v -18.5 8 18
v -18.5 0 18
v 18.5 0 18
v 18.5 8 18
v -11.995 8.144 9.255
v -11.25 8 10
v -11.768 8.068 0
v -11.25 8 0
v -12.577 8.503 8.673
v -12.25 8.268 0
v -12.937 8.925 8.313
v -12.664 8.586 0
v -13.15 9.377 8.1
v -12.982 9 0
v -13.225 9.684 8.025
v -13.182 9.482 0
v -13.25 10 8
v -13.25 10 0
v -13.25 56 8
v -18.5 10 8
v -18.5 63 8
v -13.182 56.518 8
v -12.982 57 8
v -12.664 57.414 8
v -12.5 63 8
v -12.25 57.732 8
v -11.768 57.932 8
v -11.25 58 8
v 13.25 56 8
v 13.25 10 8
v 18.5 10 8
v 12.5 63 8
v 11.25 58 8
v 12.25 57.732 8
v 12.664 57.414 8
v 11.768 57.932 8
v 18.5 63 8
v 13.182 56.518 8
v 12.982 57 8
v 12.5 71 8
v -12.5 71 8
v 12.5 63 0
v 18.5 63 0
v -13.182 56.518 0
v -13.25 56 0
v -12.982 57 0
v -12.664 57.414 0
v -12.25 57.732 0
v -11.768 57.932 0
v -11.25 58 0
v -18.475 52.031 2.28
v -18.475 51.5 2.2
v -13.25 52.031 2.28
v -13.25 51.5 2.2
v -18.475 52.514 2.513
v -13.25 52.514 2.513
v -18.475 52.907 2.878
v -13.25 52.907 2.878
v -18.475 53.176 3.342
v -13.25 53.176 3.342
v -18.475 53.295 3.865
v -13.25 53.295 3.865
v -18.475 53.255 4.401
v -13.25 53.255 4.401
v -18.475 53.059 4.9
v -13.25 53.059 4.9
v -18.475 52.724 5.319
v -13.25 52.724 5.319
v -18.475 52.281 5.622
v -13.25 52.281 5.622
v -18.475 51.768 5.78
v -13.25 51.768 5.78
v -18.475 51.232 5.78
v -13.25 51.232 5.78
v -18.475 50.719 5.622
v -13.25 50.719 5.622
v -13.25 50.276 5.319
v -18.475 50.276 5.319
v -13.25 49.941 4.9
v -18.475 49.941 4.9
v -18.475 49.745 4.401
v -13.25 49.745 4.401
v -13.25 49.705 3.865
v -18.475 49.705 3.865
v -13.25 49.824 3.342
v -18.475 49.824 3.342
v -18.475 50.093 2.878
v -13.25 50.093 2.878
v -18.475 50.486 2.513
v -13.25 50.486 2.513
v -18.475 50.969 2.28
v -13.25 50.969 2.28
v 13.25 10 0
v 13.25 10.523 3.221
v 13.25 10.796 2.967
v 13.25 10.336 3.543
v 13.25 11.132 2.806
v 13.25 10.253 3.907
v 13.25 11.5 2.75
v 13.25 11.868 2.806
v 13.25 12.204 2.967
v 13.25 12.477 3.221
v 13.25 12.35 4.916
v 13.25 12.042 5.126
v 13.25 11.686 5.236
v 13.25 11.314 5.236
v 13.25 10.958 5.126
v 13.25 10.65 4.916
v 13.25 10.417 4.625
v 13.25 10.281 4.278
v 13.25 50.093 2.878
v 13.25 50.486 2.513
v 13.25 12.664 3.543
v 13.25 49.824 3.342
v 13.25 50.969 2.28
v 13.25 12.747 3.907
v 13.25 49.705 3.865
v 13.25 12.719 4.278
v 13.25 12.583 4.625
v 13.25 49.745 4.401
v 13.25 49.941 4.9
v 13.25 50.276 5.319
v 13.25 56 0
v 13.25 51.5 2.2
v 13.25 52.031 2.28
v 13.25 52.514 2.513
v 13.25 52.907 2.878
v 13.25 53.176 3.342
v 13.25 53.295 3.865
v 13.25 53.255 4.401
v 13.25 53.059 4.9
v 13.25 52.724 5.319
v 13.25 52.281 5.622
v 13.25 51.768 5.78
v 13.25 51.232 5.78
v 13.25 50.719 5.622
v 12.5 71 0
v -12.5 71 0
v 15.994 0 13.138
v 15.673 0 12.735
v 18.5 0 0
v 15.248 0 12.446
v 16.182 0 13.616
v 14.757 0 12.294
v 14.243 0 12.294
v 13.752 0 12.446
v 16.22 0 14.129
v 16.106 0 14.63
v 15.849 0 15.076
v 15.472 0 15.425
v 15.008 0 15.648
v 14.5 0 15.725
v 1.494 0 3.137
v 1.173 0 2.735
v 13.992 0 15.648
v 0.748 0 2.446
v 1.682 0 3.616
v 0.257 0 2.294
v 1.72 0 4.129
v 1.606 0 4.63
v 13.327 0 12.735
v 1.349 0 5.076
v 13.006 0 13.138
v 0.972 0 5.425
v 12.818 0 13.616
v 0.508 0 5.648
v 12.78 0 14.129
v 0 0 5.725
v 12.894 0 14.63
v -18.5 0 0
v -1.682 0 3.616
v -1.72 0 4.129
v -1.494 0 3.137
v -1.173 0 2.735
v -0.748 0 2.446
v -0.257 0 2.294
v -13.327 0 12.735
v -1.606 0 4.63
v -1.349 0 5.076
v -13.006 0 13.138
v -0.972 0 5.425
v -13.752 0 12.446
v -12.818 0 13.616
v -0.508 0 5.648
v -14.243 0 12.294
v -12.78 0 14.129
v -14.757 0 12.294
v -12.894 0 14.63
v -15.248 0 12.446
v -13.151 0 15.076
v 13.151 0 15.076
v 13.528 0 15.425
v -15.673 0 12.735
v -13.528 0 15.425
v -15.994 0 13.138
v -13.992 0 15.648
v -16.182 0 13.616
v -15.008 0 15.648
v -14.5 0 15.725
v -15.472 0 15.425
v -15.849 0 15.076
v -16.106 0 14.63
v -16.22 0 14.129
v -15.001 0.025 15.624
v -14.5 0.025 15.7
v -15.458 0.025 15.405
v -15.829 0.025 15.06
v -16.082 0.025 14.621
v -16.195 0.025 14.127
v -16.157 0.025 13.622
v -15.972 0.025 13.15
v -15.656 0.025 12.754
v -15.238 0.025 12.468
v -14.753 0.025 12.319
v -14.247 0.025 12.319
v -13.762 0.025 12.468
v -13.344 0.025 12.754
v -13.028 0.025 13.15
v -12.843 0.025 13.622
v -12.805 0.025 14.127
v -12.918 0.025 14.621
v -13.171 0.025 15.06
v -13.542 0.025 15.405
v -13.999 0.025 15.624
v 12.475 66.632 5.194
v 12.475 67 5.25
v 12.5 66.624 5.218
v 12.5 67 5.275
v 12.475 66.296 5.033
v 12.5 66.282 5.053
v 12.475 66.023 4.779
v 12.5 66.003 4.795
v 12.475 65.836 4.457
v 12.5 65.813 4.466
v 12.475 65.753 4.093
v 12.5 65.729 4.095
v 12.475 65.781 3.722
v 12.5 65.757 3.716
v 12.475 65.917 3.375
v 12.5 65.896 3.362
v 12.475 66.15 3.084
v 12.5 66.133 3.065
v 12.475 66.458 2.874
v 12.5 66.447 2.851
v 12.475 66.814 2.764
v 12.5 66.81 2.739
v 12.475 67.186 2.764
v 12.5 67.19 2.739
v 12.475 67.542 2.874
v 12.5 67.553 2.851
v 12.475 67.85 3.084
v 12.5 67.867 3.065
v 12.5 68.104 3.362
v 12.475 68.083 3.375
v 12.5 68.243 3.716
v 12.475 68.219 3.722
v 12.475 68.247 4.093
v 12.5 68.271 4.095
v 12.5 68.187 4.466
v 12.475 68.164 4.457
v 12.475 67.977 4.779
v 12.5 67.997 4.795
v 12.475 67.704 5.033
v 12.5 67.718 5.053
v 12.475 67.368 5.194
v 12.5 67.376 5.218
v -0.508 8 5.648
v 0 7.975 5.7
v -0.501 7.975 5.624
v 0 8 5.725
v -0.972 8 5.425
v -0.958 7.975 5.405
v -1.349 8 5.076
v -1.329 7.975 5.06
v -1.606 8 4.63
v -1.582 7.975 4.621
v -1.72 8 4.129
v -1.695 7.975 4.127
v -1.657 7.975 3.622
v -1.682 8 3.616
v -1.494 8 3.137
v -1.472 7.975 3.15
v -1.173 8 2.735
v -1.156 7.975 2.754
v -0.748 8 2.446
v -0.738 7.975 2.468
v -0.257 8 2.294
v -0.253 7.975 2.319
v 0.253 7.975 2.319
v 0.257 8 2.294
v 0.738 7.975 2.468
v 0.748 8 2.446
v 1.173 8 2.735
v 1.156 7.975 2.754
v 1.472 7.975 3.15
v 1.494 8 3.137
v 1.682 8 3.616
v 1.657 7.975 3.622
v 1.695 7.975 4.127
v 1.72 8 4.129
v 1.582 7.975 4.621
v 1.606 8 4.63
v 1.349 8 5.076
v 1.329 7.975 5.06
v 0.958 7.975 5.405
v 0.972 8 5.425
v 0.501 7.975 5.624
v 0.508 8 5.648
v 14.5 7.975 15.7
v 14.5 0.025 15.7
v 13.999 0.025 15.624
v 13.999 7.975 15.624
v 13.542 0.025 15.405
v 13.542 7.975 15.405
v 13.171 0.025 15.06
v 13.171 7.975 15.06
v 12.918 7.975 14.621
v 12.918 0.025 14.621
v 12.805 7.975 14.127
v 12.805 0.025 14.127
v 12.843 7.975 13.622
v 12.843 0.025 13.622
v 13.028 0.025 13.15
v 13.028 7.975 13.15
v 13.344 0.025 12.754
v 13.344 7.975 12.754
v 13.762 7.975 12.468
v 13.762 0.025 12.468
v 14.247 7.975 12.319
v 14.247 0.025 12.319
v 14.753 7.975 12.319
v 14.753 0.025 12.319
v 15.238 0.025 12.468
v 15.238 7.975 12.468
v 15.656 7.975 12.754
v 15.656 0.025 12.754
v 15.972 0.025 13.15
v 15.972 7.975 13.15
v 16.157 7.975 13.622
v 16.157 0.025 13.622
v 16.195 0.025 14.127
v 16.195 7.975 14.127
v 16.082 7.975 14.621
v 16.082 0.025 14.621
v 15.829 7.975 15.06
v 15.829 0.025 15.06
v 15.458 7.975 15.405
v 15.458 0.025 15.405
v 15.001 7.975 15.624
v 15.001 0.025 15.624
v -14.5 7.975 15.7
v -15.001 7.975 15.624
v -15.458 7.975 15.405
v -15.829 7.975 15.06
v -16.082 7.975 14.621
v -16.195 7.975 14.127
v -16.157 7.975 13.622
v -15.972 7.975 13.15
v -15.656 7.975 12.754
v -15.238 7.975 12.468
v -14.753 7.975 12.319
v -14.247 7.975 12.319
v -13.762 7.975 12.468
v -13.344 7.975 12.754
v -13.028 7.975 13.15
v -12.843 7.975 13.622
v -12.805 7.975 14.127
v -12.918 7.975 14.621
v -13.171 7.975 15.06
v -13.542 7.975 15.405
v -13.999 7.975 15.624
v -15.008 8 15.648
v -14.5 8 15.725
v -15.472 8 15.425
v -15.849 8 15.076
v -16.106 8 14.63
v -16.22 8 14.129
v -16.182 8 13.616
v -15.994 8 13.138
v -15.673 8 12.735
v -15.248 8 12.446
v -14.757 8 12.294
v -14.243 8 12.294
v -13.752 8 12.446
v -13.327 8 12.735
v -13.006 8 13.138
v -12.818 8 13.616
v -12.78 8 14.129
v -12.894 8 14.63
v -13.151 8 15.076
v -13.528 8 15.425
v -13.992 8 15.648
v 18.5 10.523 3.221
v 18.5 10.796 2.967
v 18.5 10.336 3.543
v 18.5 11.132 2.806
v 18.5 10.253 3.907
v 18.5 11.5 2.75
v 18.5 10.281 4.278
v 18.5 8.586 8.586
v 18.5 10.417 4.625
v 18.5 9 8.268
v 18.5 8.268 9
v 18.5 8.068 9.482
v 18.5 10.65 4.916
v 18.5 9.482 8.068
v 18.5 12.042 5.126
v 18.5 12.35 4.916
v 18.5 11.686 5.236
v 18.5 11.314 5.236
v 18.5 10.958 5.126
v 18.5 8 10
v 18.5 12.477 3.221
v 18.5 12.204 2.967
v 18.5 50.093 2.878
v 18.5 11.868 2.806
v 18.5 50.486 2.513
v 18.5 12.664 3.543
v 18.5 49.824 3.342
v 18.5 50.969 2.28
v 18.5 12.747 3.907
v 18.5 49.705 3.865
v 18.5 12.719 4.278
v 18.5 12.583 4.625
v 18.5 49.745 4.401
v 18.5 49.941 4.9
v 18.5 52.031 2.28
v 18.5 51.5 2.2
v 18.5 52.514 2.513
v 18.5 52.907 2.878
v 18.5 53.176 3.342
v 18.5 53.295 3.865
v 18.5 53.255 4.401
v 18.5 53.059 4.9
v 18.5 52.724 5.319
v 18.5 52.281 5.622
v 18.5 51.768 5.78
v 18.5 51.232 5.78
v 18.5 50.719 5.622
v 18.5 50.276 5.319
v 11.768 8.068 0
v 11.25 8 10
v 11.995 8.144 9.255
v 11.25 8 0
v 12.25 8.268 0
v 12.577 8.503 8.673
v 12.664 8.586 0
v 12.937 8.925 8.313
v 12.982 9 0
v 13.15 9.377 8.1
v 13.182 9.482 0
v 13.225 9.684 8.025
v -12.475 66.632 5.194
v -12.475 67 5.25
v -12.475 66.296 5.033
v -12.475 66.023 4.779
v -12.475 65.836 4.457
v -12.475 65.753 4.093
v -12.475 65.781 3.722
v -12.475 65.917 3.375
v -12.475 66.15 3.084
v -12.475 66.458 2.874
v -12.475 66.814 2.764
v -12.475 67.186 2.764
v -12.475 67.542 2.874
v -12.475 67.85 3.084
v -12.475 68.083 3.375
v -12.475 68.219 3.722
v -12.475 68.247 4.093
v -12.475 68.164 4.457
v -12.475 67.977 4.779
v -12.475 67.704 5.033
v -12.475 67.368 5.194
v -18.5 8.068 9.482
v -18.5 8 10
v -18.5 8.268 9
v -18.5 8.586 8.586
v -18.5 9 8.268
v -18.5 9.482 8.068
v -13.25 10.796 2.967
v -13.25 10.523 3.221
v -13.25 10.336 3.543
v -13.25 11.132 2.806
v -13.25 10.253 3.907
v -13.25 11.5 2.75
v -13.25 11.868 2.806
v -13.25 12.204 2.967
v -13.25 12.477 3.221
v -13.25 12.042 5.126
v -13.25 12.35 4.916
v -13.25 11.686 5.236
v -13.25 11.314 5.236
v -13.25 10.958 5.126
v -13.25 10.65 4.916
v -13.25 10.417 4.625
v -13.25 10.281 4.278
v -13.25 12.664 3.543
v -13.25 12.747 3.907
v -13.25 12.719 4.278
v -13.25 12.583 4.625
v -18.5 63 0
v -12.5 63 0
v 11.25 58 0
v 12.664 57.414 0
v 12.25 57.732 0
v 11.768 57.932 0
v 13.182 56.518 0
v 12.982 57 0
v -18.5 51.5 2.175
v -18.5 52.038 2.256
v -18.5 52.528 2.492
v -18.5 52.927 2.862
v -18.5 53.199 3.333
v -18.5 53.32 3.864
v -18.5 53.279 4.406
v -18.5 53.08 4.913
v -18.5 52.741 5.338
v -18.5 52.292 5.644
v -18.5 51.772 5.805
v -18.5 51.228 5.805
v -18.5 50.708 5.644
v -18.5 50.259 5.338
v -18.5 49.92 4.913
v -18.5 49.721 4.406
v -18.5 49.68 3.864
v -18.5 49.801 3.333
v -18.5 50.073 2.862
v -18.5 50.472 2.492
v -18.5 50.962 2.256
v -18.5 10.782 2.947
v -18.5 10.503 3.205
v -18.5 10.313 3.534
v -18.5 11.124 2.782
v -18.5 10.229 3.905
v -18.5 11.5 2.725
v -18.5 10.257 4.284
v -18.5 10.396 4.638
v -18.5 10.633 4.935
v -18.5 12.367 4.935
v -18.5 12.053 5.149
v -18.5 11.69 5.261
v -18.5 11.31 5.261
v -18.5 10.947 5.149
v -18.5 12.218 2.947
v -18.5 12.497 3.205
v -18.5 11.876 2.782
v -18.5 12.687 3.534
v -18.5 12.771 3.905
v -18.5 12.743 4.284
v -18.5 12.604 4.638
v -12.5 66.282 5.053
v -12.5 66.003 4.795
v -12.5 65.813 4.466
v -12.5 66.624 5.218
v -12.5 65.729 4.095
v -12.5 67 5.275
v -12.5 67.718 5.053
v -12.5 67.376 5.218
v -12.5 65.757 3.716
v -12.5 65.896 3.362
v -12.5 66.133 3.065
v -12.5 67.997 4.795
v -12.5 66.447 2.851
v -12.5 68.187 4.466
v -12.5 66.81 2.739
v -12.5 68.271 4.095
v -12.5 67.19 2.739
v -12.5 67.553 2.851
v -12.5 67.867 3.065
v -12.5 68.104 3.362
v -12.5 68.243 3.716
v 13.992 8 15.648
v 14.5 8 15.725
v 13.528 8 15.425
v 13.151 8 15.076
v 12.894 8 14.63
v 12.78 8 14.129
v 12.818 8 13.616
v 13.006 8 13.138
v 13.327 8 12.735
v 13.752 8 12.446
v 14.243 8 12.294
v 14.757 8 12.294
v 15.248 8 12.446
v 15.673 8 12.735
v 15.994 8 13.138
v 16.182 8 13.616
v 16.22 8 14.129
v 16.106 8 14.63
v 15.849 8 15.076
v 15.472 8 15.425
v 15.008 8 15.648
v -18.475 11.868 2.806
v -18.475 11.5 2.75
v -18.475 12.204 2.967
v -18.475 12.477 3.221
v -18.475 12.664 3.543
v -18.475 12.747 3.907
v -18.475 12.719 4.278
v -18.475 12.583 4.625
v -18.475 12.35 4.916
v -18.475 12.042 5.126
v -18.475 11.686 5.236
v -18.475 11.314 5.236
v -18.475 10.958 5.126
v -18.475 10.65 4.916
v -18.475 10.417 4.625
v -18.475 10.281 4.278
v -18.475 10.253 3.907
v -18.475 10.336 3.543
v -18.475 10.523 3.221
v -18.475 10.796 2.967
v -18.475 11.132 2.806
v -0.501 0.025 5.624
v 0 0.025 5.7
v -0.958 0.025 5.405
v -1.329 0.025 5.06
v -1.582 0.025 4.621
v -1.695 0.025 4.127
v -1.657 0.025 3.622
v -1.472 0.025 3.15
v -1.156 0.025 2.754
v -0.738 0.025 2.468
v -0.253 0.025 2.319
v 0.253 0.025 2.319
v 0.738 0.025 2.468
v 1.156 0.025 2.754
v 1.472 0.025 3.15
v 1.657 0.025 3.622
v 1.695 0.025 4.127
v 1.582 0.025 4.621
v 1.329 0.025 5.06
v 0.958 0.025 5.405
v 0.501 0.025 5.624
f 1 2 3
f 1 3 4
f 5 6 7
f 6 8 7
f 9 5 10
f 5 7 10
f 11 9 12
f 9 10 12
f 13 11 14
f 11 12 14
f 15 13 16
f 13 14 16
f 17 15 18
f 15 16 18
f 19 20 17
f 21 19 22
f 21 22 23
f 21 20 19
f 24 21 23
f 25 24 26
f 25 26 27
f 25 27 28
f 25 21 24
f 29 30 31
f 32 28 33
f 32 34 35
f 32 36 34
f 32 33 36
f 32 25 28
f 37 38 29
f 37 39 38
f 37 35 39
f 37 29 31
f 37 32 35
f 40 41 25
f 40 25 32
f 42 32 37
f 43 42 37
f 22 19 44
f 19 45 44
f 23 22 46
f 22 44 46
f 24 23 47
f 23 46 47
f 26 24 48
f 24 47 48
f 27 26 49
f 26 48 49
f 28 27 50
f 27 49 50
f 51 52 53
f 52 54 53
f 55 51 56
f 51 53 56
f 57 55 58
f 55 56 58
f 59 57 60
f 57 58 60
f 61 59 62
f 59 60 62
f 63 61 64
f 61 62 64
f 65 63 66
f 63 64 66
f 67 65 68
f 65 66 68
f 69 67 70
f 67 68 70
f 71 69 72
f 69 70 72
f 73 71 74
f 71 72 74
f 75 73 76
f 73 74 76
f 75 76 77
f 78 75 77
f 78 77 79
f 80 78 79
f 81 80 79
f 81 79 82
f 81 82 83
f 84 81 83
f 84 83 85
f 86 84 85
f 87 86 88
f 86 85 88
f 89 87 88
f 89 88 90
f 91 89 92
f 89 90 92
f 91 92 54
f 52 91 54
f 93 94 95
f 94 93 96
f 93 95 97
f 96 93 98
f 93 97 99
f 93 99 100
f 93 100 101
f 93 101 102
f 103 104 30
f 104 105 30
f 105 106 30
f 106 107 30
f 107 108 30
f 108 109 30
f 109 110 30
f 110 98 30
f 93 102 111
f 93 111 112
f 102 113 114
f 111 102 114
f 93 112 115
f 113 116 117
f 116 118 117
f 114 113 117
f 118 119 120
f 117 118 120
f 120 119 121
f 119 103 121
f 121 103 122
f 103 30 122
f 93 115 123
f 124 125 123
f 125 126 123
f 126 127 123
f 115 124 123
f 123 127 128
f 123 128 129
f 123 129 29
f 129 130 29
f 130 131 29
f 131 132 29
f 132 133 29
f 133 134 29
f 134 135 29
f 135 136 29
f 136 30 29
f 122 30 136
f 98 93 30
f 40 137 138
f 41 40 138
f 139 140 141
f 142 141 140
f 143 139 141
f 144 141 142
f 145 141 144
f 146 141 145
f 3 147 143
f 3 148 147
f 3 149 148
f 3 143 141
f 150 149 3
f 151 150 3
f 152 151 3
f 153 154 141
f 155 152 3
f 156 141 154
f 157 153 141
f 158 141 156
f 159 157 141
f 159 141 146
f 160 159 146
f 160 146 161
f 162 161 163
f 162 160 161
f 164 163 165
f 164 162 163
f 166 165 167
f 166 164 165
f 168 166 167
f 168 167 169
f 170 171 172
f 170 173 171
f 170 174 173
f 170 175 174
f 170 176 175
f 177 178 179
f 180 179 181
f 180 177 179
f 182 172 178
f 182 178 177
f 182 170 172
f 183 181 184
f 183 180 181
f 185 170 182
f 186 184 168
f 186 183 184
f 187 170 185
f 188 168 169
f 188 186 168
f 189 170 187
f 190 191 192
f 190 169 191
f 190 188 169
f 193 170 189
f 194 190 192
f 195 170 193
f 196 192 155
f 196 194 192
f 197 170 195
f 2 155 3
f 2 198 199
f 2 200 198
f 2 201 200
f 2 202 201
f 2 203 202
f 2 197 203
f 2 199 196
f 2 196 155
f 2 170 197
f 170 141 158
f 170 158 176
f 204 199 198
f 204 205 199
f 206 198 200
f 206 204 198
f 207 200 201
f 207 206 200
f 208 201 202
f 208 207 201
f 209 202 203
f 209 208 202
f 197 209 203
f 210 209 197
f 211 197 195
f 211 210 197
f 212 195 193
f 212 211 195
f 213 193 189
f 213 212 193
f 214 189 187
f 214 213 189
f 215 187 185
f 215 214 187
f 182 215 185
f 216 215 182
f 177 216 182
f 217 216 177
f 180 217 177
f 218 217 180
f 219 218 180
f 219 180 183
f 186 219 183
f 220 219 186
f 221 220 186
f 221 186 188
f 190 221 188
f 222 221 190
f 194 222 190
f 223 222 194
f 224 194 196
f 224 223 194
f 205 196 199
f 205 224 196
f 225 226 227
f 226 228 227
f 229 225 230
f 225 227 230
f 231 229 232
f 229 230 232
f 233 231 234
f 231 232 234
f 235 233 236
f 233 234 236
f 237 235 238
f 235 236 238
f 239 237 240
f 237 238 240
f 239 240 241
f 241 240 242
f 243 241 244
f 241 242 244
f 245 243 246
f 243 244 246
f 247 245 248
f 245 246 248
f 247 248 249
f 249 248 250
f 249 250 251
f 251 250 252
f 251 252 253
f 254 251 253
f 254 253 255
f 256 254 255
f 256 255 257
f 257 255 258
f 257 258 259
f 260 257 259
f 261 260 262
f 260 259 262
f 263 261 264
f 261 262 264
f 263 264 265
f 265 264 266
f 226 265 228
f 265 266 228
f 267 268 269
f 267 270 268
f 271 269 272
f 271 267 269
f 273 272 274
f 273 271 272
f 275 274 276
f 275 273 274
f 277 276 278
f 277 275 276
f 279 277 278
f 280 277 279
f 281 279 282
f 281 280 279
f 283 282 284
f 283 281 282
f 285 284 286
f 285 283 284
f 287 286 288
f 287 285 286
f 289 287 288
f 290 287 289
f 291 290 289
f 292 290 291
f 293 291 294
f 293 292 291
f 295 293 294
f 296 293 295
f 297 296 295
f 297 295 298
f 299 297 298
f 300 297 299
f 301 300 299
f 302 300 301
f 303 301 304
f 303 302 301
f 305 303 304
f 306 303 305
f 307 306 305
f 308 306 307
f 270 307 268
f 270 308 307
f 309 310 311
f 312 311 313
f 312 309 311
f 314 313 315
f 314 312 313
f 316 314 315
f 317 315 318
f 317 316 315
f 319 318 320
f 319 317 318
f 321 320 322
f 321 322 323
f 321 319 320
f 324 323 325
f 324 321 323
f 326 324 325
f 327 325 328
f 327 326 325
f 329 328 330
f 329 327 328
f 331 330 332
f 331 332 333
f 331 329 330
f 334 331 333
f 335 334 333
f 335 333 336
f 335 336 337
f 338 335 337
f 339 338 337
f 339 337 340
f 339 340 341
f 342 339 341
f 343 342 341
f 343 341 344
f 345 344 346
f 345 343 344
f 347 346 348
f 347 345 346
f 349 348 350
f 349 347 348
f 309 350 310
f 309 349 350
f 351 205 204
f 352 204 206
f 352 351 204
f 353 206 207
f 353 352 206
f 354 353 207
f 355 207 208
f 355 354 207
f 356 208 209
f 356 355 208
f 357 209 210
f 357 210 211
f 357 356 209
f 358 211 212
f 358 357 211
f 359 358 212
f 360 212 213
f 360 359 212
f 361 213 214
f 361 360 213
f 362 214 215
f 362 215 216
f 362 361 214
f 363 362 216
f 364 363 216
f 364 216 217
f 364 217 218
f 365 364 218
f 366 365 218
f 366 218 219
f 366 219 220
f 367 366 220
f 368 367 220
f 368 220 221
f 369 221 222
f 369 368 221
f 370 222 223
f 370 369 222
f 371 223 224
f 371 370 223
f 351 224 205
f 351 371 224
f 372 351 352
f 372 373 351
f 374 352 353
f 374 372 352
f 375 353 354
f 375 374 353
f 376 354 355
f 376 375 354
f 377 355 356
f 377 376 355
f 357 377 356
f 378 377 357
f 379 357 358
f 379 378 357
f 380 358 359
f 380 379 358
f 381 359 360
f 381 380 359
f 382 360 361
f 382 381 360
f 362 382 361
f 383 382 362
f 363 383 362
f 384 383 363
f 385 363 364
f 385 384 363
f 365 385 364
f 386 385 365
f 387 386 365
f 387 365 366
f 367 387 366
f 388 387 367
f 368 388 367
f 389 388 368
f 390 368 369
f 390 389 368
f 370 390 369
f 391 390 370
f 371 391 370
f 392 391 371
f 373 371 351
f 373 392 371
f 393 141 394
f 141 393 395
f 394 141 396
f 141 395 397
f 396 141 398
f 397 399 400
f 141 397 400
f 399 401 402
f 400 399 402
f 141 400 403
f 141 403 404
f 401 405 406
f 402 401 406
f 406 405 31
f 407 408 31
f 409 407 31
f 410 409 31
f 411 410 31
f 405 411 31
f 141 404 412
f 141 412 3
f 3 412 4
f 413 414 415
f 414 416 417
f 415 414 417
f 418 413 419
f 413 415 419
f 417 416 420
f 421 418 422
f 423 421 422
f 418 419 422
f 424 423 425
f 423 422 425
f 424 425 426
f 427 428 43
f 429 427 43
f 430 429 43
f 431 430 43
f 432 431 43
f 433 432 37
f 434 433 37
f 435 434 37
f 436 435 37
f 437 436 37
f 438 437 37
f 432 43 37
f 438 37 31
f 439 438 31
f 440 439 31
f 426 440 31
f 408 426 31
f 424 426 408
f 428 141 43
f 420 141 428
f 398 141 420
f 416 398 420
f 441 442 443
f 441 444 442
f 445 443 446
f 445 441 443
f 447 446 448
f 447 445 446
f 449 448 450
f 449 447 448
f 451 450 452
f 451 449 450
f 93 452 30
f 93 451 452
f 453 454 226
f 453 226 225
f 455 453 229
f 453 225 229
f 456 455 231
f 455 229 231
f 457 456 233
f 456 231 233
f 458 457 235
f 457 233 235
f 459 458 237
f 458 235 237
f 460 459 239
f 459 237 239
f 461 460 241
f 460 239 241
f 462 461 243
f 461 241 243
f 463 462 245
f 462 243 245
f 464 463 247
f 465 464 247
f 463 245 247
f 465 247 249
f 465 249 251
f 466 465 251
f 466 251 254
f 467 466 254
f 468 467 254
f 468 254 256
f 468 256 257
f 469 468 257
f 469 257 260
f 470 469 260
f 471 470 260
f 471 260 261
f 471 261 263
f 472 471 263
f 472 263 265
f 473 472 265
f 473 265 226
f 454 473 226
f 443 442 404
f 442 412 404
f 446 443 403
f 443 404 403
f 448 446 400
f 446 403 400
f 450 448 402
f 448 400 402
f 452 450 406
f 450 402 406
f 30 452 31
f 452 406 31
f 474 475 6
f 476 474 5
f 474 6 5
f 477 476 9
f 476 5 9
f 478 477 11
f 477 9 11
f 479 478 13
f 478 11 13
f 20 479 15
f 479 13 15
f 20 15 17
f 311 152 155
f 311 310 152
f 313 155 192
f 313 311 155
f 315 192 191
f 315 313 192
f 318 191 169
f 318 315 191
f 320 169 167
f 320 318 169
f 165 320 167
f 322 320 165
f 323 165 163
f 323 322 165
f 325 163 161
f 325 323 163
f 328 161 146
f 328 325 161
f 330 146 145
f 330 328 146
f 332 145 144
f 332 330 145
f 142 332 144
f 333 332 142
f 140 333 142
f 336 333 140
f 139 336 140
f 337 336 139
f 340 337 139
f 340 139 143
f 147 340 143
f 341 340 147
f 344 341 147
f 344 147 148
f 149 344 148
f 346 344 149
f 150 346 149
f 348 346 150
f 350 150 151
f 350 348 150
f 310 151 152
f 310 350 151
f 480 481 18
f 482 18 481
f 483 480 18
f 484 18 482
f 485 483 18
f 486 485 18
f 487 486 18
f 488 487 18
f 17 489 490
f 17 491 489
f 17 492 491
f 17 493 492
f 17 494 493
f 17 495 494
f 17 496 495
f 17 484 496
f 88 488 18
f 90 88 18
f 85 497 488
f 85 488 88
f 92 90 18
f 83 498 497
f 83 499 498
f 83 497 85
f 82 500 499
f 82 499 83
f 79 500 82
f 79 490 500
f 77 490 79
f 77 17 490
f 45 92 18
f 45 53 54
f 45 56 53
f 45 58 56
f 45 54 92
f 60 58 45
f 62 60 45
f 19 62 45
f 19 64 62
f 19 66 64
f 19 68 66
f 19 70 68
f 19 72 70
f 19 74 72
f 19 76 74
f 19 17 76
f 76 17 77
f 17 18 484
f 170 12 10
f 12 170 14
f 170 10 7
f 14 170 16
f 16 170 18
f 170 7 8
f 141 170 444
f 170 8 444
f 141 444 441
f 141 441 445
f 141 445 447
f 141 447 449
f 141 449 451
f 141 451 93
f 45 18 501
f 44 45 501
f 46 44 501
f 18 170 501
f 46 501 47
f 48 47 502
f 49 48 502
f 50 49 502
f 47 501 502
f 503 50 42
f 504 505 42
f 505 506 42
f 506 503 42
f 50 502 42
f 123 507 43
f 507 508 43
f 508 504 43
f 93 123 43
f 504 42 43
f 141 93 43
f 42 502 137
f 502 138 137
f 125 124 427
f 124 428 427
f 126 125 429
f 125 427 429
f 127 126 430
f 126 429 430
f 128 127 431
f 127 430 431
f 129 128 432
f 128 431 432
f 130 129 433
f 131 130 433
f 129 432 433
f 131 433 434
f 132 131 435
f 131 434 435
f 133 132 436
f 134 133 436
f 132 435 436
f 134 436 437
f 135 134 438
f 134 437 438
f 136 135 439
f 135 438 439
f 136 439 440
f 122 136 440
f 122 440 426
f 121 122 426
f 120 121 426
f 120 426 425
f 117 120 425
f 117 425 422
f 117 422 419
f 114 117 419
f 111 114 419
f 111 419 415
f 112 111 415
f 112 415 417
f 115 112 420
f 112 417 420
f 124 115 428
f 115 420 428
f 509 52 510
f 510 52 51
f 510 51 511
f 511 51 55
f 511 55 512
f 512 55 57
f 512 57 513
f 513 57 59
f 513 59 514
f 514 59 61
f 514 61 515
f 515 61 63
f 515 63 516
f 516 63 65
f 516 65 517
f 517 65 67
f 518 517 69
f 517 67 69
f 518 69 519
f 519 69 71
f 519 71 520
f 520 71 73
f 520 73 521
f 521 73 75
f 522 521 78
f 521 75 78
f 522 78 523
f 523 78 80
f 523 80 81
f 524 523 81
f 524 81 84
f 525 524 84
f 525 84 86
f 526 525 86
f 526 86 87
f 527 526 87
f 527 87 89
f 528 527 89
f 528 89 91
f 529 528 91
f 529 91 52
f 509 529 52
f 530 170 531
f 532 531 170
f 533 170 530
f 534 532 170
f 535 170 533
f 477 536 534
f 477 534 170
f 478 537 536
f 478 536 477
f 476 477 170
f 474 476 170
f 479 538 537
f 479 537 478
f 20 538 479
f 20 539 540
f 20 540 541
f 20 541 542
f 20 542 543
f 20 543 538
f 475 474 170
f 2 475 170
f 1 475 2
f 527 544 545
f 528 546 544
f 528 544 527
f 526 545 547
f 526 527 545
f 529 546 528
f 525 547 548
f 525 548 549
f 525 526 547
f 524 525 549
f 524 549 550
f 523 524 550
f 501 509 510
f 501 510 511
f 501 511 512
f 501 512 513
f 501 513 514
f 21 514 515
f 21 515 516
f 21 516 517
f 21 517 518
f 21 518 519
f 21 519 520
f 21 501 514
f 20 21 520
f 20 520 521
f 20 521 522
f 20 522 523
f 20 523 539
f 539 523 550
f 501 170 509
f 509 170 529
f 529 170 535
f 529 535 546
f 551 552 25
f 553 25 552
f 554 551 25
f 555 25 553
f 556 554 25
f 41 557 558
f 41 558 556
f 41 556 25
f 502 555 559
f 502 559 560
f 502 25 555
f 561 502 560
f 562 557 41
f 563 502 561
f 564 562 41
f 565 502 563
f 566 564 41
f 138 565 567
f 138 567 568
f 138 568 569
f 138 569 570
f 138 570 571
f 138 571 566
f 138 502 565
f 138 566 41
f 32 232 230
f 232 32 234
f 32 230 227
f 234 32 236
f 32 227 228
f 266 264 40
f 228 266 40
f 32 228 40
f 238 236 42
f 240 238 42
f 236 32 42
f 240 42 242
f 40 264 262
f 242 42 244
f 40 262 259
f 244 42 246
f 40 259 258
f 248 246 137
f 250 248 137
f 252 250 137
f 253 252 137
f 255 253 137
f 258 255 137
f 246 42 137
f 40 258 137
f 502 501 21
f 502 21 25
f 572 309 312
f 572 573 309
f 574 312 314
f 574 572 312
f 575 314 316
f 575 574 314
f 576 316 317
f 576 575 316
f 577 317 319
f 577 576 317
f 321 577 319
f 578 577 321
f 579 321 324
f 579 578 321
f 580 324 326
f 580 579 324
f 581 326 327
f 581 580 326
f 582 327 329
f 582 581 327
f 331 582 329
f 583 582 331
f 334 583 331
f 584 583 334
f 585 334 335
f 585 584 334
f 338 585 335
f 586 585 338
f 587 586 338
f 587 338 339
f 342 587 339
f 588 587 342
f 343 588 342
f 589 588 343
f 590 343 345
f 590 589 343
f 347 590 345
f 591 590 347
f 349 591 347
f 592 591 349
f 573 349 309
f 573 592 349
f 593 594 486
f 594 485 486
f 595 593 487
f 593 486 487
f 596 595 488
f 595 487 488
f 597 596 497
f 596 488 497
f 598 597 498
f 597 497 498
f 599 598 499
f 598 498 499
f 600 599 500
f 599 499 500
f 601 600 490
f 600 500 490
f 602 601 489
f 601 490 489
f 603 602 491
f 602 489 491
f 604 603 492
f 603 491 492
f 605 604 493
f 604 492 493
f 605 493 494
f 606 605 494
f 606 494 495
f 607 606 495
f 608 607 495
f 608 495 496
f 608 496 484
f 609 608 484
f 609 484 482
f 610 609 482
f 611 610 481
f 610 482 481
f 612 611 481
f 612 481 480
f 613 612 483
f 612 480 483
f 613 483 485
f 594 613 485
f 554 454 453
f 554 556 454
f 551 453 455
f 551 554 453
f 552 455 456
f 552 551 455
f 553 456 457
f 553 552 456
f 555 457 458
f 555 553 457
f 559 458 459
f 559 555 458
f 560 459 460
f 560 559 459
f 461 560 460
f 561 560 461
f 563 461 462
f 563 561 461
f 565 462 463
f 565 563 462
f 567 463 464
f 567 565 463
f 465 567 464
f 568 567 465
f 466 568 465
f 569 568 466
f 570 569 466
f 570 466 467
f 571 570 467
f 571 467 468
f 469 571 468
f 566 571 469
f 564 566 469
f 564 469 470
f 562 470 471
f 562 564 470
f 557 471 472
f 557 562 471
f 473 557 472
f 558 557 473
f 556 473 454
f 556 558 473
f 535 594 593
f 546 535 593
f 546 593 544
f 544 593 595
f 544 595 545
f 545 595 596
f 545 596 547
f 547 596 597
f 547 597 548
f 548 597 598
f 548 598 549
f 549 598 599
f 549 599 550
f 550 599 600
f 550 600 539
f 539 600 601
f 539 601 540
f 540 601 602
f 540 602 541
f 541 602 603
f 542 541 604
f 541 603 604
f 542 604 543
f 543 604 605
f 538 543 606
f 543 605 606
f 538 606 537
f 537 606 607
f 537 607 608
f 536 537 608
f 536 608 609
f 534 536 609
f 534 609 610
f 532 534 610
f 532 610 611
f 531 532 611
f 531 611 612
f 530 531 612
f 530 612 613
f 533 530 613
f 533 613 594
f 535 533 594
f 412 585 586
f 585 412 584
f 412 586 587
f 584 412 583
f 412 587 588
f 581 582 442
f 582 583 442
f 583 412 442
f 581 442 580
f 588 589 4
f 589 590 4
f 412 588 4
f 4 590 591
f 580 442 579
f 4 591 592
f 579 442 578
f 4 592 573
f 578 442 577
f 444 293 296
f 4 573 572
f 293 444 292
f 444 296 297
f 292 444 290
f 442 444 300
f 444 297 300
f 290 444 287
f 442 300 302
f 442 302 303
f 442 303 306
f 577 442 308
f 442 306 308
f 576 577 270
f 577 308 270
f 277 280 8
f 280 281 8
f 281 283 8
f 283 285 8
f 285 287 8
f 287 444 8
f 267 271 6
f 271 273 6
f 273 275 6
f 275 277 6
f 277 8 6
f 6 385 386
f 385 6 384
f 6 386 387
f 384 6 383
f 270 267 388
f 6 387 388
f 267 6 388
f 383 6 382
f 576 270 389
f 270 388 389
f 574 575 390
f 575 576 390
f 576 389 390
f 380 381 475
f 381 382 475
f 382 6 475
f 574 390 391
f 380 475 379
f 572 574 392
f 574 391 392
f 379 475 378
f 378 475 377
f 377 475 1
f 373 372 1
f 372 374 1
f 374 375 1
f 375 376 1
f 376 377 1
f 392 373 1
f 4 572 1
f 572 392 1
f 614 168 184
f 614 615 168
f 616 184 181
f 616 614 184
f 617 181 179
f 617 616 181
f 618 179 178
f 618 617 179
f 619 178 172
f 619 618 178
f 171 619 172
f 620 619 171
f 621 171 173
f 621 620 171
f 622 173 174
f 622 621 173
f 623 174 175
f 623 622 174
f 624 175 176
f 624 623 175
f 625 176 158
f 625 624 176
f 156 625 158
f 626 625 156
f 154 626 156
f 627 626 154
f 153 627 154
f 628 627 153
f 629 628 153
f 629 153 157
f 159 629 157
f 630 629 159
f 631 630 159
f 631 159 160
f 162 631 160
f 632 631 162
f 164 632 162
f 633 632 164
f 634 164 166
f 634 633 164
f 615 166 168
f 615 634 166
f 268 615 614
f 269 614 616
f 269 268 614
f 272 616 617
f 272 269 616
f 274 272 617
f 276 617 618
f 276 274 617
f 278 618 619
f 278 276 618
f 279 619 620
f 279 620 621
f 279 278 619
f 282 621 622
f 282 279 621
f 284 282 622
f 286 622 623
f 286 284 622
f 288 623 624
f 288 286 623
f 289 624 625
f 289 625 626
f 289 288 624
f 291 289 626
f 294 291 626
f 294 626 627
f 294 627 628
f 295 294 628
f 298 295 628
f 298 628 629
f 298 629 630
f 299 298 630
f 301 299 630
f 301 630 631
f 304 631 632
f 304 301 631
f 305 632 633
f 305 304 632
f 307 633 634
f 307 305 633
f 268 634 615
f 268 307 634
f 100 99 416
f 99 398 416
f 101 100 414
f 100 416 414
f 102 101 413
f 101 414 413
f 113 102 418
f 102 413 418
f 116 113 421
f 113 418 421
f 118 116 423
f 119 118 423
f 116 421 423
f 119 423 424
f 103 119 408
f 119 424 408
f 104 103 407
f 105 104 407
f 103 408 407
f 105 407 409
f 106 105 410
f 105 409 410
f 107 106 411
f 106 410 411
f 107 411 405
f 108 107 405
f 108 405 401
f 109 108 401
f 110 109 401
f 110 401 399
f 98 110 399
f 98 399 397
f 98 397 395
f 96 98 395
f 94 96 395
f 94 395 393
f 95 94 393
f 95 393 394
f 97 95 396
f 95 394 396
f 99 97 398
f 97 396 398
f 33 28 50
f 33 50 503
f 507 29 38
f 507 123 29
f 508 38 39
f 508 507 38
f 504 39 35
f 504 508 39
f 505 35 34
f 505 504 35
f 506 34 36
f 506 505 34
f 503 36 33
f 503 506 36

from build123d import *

# Parameters (mm, degrees)
SKETCH1_W                             = 37
SKETCH1_H                             = 63
BOSS_EXTRUDE1_DEPTH                   = 8
SKETCH2_R                             = 1
CUT_EXTRUDE1_DEPTH                    = 10
SKETCH3_W                             = 10
SKETCH3_H                             = 8
BOSS_EXTRUDE2_DEPTH                   = 37
CUT_EXTRUDE2_REACH                    = 68.417
SKETCH4_W                             = 26.5
SKETCH4_H                             = 50
M3_CLEARANCE_HOLE1_AT_2_COUNT         = 2
M3_CLEARANCE_HOLE1_AT_2_PITCH         = 29
M3_CLEARANCE_HOLE1_AT_3_COUNT         = 2
M3_CLEARANCE_HOLE1_AT_3_PITCH         = 17.613914954
FILLET1_R                             = 2
SKETCH8_W                             = 25
SKETCH8_H                             = 8
BOSS_EXTRUDE3_DEPTH                   = 8
SKETCH9_R                             = 1
CUT_EXTRUDE3_DEPTH                    = 5
TAP_DRILL_FOR_M3X0_5_TAP1_D           = 2.5
TAP_DRILL_FOR_M3X0_5_TAP1_CSINK_D     = 2.55
TAP_DRILL_FOR_M3X0_5_TAP1_CSINK_ANGLE = 90
M3_CLEARANCE_HOLE2_D                  = 3.6
M3_CLEARANCE_HOLE2_CSINK_D            = 3.65
M3_CLEARANCE_HOLE2_CSINK_ANGLE        = 90


with BuildPart() as part:
    # Sketch1 → Boss-Extrude1 (new body)
    with BuildSketch(Plane.XY):
        with Locations((0, 31.5)):
            Rectangle(SKETCH1_W, SKETCH1_H)
    extrude(amount=BOSS_EXTRUDE1_DEPTH)

    # Sketch2 → Cut-Extrude1 (cut)
    with BuildSketch(Plane.ZY.offset(18.5)):
        with Locations((4, 51.5)):
            Circle(SKETCH2_R)
        with Locations((4, 11.5)):
            Circle(SKETCH2_R)
    cut_extrude1 = extrude(amount=-CUT_EXTRUDE1_DEPTH, mode=Mode.SUBTRACT)

    # Mirror1: Cut-Extrude1 across plane
    add(cut_extrude1.mirror(Plane(origin=(0, 0, 0), x_dir=(0, 0, 1), z_dir=(1, 0, 0))), mode=Mode.SUBTRACT)

    # Sketch3 → Boss-Extrude2 (add)
    with BuildSketch(Plane.ZY.offset(18.5)):
        with Locations((13, 4)):
            Rectangle(SKETCH3_W, SKETCH3_H)
    extrude(amount=-BOSS_EXTRUDE2_DEPTH)

    # Sketch4 → Cut-Extrude2 (cut, up to next)
    with BuildSketch(Plane.XY.offset(8), mode=Mode.PRIVATE) as cut_extrude2_sk1:
        with Locations((0, 33)):
            Rectangle(SKETCH4_W, SKETCH4_H)
    cut_extrude2_tool1 = extrude(cut_extrude2_sk1.sketch, amount=-CUT_EXTRUDE2_REACH, mode=Mode.PRIVATE) & part.part
    add(cut_extrude2_tool1.solids().sort_by_distance((0, 33, 8))[0], mode=Mode.SUBTRACT)

    # Sketch7 → M3 Clearance Hole1 (revolve, cut)
    with BuildSketch(Plane(origin=(-14.5, 8, 14), x_dir=(0, 0, 1), z_dir=(1, 0, 0))):
        Polygon((0, 0), (0, 8), (1.725, 8), (1.7, 7.975), (1.7, 0.025), (1.725, 0), align=None)
    m3_clearance_hole1 = revolve(axis=Axis((-14.5, 14.35, 14), (0, -1, 0)), mode=Mode.SUBTRACT)

    # M3 Clearance Hole1 at 2: M3 Clearance Hole1 ×2
    with Locations(*[(i * M3_CLEARANCE_HOLE1_AT_2_PITCH, 0, 0) for i in range(1, M3_CLEARANCE_HOLE1_AT_2_COUNT)]):
        add(m3_clearance_hole1, mode=Mode.SUBTRACT)

    # M3 Clearance Hole1 at 3: M3 Clearance Hole1 ×2
    with Locations(*[Vector(0.8232127859153063, 0, -0.5677329558036597) * (i * M3_CLEARANCE_HOLE1_AT_3_PITCH) for i in range(1, M3_CLEARANCE_HOLE1_AT_3_COUNT)]):
        add(m3_clearance_hole1, mode=Mode.SUBTRACT)

    # Fillet1
    fillet1_edges = [part.edges().sort_by_distance(p)[0] for p in [
        (15.875, 8, 8),
        (-15.875, 8, 8),
        (-13.25, 8, 4),
        (-13.25, 58, 4),
        (13.25, 58, 4),
        (13.25, 8, 4),
    ]]
    fillet(fillet1_edges, radius=FILLET1_R)

    # Sketch8 → Boss-Extrude3 (add)
    with BuildSketch(Plane(origin=(0, 0, 0), x_dir=(-1, 0, 0), z_dir=(0, 0, -1))):
        with Locations((0, 67)):
            Rectangle(SKETCH8_W, SKETCH8_H)
    extrude(amount=-BOSS_EXTRUDE3_DEPTH)

    # Sketch9 → Cut-Extrude3 (cut)
    with BuildSketch(Plane.ZY.offset(12.5)):
        with Locations(Location((4, 67, 0), (0, 0, 270))):
            Circle(SKETCH9_R)
    cut_extrude3 = extrude(amount=-CUT_EXTRUDE3_DEPTH, mode=Mode.SUBTRACT)

    # Mirror2: Cut-Extrude3 across plane
    add(cut_extrude3.mirror(Plane(origin=(0, 0, 0), x_dir=(0, 0, 1), z_dir=(1, 0, 0))), mode=Mode.SUBTRACT)

    # Tap Drill for M3x0.5 Tap1 (through all)
    with Locations(Plane.ZY.offset(18.5)):
        with Locations((4, 11.5)):
            CounterSinkHole(TAP_DRILL_FOR_M3X0_5_TAP1_D / 2, TAP_DRILL_FOR_M3X0_5_TAP1_CSINK_D / 2, counter_sink_angle=TAP_DRILL_FOR_M3X0_5_TAP1_CSINK_ANGLE)

    # M3 Clearance Hole2 (through all)
    with Locations(Plane.ZY.offset(18.5)):
        with Locations((4, 51.5)):
            CounterSinkHole(M3_CLEARANCE_HOLE2_D / 2, M3_CLEARANCE_HOLE2_CSINK_D / 2, counter_sink_angle=M3_CLEARANCE_HOLE2_CSINK_ANGLE)

    # Sketch15 → Tap Drill for M3x0.5 Tap2 (revolve, cut)
    with BuildSketch(Plane(origin=(-12.5, 67, 4), x_dir=(0, 0, 1), z_dir=(0, 1, 0))):
        Polygon((0, 0), (0, 20.751075774), (1.25, 20), (1.25, 0.025), (1.275, 0), align=None)
    tap_drill_for_m3x0_5_tap2 = revolve(axis=Axis((-18.85, 67, 4), (1, 0, 0)), mode=Mode.SUBTRACT)

    # Mirror3: Tap Drill for M3x0.5 Tap2 across plane
    add(tap_drill_for_m3x0_5_tap2.mirror(Plane(origin=(0, 0, 0), x_dir=(0, 0, 1), z_dir=(1, 0, 0))), mode=Mode.SUBTRACT)


solid = part.part
